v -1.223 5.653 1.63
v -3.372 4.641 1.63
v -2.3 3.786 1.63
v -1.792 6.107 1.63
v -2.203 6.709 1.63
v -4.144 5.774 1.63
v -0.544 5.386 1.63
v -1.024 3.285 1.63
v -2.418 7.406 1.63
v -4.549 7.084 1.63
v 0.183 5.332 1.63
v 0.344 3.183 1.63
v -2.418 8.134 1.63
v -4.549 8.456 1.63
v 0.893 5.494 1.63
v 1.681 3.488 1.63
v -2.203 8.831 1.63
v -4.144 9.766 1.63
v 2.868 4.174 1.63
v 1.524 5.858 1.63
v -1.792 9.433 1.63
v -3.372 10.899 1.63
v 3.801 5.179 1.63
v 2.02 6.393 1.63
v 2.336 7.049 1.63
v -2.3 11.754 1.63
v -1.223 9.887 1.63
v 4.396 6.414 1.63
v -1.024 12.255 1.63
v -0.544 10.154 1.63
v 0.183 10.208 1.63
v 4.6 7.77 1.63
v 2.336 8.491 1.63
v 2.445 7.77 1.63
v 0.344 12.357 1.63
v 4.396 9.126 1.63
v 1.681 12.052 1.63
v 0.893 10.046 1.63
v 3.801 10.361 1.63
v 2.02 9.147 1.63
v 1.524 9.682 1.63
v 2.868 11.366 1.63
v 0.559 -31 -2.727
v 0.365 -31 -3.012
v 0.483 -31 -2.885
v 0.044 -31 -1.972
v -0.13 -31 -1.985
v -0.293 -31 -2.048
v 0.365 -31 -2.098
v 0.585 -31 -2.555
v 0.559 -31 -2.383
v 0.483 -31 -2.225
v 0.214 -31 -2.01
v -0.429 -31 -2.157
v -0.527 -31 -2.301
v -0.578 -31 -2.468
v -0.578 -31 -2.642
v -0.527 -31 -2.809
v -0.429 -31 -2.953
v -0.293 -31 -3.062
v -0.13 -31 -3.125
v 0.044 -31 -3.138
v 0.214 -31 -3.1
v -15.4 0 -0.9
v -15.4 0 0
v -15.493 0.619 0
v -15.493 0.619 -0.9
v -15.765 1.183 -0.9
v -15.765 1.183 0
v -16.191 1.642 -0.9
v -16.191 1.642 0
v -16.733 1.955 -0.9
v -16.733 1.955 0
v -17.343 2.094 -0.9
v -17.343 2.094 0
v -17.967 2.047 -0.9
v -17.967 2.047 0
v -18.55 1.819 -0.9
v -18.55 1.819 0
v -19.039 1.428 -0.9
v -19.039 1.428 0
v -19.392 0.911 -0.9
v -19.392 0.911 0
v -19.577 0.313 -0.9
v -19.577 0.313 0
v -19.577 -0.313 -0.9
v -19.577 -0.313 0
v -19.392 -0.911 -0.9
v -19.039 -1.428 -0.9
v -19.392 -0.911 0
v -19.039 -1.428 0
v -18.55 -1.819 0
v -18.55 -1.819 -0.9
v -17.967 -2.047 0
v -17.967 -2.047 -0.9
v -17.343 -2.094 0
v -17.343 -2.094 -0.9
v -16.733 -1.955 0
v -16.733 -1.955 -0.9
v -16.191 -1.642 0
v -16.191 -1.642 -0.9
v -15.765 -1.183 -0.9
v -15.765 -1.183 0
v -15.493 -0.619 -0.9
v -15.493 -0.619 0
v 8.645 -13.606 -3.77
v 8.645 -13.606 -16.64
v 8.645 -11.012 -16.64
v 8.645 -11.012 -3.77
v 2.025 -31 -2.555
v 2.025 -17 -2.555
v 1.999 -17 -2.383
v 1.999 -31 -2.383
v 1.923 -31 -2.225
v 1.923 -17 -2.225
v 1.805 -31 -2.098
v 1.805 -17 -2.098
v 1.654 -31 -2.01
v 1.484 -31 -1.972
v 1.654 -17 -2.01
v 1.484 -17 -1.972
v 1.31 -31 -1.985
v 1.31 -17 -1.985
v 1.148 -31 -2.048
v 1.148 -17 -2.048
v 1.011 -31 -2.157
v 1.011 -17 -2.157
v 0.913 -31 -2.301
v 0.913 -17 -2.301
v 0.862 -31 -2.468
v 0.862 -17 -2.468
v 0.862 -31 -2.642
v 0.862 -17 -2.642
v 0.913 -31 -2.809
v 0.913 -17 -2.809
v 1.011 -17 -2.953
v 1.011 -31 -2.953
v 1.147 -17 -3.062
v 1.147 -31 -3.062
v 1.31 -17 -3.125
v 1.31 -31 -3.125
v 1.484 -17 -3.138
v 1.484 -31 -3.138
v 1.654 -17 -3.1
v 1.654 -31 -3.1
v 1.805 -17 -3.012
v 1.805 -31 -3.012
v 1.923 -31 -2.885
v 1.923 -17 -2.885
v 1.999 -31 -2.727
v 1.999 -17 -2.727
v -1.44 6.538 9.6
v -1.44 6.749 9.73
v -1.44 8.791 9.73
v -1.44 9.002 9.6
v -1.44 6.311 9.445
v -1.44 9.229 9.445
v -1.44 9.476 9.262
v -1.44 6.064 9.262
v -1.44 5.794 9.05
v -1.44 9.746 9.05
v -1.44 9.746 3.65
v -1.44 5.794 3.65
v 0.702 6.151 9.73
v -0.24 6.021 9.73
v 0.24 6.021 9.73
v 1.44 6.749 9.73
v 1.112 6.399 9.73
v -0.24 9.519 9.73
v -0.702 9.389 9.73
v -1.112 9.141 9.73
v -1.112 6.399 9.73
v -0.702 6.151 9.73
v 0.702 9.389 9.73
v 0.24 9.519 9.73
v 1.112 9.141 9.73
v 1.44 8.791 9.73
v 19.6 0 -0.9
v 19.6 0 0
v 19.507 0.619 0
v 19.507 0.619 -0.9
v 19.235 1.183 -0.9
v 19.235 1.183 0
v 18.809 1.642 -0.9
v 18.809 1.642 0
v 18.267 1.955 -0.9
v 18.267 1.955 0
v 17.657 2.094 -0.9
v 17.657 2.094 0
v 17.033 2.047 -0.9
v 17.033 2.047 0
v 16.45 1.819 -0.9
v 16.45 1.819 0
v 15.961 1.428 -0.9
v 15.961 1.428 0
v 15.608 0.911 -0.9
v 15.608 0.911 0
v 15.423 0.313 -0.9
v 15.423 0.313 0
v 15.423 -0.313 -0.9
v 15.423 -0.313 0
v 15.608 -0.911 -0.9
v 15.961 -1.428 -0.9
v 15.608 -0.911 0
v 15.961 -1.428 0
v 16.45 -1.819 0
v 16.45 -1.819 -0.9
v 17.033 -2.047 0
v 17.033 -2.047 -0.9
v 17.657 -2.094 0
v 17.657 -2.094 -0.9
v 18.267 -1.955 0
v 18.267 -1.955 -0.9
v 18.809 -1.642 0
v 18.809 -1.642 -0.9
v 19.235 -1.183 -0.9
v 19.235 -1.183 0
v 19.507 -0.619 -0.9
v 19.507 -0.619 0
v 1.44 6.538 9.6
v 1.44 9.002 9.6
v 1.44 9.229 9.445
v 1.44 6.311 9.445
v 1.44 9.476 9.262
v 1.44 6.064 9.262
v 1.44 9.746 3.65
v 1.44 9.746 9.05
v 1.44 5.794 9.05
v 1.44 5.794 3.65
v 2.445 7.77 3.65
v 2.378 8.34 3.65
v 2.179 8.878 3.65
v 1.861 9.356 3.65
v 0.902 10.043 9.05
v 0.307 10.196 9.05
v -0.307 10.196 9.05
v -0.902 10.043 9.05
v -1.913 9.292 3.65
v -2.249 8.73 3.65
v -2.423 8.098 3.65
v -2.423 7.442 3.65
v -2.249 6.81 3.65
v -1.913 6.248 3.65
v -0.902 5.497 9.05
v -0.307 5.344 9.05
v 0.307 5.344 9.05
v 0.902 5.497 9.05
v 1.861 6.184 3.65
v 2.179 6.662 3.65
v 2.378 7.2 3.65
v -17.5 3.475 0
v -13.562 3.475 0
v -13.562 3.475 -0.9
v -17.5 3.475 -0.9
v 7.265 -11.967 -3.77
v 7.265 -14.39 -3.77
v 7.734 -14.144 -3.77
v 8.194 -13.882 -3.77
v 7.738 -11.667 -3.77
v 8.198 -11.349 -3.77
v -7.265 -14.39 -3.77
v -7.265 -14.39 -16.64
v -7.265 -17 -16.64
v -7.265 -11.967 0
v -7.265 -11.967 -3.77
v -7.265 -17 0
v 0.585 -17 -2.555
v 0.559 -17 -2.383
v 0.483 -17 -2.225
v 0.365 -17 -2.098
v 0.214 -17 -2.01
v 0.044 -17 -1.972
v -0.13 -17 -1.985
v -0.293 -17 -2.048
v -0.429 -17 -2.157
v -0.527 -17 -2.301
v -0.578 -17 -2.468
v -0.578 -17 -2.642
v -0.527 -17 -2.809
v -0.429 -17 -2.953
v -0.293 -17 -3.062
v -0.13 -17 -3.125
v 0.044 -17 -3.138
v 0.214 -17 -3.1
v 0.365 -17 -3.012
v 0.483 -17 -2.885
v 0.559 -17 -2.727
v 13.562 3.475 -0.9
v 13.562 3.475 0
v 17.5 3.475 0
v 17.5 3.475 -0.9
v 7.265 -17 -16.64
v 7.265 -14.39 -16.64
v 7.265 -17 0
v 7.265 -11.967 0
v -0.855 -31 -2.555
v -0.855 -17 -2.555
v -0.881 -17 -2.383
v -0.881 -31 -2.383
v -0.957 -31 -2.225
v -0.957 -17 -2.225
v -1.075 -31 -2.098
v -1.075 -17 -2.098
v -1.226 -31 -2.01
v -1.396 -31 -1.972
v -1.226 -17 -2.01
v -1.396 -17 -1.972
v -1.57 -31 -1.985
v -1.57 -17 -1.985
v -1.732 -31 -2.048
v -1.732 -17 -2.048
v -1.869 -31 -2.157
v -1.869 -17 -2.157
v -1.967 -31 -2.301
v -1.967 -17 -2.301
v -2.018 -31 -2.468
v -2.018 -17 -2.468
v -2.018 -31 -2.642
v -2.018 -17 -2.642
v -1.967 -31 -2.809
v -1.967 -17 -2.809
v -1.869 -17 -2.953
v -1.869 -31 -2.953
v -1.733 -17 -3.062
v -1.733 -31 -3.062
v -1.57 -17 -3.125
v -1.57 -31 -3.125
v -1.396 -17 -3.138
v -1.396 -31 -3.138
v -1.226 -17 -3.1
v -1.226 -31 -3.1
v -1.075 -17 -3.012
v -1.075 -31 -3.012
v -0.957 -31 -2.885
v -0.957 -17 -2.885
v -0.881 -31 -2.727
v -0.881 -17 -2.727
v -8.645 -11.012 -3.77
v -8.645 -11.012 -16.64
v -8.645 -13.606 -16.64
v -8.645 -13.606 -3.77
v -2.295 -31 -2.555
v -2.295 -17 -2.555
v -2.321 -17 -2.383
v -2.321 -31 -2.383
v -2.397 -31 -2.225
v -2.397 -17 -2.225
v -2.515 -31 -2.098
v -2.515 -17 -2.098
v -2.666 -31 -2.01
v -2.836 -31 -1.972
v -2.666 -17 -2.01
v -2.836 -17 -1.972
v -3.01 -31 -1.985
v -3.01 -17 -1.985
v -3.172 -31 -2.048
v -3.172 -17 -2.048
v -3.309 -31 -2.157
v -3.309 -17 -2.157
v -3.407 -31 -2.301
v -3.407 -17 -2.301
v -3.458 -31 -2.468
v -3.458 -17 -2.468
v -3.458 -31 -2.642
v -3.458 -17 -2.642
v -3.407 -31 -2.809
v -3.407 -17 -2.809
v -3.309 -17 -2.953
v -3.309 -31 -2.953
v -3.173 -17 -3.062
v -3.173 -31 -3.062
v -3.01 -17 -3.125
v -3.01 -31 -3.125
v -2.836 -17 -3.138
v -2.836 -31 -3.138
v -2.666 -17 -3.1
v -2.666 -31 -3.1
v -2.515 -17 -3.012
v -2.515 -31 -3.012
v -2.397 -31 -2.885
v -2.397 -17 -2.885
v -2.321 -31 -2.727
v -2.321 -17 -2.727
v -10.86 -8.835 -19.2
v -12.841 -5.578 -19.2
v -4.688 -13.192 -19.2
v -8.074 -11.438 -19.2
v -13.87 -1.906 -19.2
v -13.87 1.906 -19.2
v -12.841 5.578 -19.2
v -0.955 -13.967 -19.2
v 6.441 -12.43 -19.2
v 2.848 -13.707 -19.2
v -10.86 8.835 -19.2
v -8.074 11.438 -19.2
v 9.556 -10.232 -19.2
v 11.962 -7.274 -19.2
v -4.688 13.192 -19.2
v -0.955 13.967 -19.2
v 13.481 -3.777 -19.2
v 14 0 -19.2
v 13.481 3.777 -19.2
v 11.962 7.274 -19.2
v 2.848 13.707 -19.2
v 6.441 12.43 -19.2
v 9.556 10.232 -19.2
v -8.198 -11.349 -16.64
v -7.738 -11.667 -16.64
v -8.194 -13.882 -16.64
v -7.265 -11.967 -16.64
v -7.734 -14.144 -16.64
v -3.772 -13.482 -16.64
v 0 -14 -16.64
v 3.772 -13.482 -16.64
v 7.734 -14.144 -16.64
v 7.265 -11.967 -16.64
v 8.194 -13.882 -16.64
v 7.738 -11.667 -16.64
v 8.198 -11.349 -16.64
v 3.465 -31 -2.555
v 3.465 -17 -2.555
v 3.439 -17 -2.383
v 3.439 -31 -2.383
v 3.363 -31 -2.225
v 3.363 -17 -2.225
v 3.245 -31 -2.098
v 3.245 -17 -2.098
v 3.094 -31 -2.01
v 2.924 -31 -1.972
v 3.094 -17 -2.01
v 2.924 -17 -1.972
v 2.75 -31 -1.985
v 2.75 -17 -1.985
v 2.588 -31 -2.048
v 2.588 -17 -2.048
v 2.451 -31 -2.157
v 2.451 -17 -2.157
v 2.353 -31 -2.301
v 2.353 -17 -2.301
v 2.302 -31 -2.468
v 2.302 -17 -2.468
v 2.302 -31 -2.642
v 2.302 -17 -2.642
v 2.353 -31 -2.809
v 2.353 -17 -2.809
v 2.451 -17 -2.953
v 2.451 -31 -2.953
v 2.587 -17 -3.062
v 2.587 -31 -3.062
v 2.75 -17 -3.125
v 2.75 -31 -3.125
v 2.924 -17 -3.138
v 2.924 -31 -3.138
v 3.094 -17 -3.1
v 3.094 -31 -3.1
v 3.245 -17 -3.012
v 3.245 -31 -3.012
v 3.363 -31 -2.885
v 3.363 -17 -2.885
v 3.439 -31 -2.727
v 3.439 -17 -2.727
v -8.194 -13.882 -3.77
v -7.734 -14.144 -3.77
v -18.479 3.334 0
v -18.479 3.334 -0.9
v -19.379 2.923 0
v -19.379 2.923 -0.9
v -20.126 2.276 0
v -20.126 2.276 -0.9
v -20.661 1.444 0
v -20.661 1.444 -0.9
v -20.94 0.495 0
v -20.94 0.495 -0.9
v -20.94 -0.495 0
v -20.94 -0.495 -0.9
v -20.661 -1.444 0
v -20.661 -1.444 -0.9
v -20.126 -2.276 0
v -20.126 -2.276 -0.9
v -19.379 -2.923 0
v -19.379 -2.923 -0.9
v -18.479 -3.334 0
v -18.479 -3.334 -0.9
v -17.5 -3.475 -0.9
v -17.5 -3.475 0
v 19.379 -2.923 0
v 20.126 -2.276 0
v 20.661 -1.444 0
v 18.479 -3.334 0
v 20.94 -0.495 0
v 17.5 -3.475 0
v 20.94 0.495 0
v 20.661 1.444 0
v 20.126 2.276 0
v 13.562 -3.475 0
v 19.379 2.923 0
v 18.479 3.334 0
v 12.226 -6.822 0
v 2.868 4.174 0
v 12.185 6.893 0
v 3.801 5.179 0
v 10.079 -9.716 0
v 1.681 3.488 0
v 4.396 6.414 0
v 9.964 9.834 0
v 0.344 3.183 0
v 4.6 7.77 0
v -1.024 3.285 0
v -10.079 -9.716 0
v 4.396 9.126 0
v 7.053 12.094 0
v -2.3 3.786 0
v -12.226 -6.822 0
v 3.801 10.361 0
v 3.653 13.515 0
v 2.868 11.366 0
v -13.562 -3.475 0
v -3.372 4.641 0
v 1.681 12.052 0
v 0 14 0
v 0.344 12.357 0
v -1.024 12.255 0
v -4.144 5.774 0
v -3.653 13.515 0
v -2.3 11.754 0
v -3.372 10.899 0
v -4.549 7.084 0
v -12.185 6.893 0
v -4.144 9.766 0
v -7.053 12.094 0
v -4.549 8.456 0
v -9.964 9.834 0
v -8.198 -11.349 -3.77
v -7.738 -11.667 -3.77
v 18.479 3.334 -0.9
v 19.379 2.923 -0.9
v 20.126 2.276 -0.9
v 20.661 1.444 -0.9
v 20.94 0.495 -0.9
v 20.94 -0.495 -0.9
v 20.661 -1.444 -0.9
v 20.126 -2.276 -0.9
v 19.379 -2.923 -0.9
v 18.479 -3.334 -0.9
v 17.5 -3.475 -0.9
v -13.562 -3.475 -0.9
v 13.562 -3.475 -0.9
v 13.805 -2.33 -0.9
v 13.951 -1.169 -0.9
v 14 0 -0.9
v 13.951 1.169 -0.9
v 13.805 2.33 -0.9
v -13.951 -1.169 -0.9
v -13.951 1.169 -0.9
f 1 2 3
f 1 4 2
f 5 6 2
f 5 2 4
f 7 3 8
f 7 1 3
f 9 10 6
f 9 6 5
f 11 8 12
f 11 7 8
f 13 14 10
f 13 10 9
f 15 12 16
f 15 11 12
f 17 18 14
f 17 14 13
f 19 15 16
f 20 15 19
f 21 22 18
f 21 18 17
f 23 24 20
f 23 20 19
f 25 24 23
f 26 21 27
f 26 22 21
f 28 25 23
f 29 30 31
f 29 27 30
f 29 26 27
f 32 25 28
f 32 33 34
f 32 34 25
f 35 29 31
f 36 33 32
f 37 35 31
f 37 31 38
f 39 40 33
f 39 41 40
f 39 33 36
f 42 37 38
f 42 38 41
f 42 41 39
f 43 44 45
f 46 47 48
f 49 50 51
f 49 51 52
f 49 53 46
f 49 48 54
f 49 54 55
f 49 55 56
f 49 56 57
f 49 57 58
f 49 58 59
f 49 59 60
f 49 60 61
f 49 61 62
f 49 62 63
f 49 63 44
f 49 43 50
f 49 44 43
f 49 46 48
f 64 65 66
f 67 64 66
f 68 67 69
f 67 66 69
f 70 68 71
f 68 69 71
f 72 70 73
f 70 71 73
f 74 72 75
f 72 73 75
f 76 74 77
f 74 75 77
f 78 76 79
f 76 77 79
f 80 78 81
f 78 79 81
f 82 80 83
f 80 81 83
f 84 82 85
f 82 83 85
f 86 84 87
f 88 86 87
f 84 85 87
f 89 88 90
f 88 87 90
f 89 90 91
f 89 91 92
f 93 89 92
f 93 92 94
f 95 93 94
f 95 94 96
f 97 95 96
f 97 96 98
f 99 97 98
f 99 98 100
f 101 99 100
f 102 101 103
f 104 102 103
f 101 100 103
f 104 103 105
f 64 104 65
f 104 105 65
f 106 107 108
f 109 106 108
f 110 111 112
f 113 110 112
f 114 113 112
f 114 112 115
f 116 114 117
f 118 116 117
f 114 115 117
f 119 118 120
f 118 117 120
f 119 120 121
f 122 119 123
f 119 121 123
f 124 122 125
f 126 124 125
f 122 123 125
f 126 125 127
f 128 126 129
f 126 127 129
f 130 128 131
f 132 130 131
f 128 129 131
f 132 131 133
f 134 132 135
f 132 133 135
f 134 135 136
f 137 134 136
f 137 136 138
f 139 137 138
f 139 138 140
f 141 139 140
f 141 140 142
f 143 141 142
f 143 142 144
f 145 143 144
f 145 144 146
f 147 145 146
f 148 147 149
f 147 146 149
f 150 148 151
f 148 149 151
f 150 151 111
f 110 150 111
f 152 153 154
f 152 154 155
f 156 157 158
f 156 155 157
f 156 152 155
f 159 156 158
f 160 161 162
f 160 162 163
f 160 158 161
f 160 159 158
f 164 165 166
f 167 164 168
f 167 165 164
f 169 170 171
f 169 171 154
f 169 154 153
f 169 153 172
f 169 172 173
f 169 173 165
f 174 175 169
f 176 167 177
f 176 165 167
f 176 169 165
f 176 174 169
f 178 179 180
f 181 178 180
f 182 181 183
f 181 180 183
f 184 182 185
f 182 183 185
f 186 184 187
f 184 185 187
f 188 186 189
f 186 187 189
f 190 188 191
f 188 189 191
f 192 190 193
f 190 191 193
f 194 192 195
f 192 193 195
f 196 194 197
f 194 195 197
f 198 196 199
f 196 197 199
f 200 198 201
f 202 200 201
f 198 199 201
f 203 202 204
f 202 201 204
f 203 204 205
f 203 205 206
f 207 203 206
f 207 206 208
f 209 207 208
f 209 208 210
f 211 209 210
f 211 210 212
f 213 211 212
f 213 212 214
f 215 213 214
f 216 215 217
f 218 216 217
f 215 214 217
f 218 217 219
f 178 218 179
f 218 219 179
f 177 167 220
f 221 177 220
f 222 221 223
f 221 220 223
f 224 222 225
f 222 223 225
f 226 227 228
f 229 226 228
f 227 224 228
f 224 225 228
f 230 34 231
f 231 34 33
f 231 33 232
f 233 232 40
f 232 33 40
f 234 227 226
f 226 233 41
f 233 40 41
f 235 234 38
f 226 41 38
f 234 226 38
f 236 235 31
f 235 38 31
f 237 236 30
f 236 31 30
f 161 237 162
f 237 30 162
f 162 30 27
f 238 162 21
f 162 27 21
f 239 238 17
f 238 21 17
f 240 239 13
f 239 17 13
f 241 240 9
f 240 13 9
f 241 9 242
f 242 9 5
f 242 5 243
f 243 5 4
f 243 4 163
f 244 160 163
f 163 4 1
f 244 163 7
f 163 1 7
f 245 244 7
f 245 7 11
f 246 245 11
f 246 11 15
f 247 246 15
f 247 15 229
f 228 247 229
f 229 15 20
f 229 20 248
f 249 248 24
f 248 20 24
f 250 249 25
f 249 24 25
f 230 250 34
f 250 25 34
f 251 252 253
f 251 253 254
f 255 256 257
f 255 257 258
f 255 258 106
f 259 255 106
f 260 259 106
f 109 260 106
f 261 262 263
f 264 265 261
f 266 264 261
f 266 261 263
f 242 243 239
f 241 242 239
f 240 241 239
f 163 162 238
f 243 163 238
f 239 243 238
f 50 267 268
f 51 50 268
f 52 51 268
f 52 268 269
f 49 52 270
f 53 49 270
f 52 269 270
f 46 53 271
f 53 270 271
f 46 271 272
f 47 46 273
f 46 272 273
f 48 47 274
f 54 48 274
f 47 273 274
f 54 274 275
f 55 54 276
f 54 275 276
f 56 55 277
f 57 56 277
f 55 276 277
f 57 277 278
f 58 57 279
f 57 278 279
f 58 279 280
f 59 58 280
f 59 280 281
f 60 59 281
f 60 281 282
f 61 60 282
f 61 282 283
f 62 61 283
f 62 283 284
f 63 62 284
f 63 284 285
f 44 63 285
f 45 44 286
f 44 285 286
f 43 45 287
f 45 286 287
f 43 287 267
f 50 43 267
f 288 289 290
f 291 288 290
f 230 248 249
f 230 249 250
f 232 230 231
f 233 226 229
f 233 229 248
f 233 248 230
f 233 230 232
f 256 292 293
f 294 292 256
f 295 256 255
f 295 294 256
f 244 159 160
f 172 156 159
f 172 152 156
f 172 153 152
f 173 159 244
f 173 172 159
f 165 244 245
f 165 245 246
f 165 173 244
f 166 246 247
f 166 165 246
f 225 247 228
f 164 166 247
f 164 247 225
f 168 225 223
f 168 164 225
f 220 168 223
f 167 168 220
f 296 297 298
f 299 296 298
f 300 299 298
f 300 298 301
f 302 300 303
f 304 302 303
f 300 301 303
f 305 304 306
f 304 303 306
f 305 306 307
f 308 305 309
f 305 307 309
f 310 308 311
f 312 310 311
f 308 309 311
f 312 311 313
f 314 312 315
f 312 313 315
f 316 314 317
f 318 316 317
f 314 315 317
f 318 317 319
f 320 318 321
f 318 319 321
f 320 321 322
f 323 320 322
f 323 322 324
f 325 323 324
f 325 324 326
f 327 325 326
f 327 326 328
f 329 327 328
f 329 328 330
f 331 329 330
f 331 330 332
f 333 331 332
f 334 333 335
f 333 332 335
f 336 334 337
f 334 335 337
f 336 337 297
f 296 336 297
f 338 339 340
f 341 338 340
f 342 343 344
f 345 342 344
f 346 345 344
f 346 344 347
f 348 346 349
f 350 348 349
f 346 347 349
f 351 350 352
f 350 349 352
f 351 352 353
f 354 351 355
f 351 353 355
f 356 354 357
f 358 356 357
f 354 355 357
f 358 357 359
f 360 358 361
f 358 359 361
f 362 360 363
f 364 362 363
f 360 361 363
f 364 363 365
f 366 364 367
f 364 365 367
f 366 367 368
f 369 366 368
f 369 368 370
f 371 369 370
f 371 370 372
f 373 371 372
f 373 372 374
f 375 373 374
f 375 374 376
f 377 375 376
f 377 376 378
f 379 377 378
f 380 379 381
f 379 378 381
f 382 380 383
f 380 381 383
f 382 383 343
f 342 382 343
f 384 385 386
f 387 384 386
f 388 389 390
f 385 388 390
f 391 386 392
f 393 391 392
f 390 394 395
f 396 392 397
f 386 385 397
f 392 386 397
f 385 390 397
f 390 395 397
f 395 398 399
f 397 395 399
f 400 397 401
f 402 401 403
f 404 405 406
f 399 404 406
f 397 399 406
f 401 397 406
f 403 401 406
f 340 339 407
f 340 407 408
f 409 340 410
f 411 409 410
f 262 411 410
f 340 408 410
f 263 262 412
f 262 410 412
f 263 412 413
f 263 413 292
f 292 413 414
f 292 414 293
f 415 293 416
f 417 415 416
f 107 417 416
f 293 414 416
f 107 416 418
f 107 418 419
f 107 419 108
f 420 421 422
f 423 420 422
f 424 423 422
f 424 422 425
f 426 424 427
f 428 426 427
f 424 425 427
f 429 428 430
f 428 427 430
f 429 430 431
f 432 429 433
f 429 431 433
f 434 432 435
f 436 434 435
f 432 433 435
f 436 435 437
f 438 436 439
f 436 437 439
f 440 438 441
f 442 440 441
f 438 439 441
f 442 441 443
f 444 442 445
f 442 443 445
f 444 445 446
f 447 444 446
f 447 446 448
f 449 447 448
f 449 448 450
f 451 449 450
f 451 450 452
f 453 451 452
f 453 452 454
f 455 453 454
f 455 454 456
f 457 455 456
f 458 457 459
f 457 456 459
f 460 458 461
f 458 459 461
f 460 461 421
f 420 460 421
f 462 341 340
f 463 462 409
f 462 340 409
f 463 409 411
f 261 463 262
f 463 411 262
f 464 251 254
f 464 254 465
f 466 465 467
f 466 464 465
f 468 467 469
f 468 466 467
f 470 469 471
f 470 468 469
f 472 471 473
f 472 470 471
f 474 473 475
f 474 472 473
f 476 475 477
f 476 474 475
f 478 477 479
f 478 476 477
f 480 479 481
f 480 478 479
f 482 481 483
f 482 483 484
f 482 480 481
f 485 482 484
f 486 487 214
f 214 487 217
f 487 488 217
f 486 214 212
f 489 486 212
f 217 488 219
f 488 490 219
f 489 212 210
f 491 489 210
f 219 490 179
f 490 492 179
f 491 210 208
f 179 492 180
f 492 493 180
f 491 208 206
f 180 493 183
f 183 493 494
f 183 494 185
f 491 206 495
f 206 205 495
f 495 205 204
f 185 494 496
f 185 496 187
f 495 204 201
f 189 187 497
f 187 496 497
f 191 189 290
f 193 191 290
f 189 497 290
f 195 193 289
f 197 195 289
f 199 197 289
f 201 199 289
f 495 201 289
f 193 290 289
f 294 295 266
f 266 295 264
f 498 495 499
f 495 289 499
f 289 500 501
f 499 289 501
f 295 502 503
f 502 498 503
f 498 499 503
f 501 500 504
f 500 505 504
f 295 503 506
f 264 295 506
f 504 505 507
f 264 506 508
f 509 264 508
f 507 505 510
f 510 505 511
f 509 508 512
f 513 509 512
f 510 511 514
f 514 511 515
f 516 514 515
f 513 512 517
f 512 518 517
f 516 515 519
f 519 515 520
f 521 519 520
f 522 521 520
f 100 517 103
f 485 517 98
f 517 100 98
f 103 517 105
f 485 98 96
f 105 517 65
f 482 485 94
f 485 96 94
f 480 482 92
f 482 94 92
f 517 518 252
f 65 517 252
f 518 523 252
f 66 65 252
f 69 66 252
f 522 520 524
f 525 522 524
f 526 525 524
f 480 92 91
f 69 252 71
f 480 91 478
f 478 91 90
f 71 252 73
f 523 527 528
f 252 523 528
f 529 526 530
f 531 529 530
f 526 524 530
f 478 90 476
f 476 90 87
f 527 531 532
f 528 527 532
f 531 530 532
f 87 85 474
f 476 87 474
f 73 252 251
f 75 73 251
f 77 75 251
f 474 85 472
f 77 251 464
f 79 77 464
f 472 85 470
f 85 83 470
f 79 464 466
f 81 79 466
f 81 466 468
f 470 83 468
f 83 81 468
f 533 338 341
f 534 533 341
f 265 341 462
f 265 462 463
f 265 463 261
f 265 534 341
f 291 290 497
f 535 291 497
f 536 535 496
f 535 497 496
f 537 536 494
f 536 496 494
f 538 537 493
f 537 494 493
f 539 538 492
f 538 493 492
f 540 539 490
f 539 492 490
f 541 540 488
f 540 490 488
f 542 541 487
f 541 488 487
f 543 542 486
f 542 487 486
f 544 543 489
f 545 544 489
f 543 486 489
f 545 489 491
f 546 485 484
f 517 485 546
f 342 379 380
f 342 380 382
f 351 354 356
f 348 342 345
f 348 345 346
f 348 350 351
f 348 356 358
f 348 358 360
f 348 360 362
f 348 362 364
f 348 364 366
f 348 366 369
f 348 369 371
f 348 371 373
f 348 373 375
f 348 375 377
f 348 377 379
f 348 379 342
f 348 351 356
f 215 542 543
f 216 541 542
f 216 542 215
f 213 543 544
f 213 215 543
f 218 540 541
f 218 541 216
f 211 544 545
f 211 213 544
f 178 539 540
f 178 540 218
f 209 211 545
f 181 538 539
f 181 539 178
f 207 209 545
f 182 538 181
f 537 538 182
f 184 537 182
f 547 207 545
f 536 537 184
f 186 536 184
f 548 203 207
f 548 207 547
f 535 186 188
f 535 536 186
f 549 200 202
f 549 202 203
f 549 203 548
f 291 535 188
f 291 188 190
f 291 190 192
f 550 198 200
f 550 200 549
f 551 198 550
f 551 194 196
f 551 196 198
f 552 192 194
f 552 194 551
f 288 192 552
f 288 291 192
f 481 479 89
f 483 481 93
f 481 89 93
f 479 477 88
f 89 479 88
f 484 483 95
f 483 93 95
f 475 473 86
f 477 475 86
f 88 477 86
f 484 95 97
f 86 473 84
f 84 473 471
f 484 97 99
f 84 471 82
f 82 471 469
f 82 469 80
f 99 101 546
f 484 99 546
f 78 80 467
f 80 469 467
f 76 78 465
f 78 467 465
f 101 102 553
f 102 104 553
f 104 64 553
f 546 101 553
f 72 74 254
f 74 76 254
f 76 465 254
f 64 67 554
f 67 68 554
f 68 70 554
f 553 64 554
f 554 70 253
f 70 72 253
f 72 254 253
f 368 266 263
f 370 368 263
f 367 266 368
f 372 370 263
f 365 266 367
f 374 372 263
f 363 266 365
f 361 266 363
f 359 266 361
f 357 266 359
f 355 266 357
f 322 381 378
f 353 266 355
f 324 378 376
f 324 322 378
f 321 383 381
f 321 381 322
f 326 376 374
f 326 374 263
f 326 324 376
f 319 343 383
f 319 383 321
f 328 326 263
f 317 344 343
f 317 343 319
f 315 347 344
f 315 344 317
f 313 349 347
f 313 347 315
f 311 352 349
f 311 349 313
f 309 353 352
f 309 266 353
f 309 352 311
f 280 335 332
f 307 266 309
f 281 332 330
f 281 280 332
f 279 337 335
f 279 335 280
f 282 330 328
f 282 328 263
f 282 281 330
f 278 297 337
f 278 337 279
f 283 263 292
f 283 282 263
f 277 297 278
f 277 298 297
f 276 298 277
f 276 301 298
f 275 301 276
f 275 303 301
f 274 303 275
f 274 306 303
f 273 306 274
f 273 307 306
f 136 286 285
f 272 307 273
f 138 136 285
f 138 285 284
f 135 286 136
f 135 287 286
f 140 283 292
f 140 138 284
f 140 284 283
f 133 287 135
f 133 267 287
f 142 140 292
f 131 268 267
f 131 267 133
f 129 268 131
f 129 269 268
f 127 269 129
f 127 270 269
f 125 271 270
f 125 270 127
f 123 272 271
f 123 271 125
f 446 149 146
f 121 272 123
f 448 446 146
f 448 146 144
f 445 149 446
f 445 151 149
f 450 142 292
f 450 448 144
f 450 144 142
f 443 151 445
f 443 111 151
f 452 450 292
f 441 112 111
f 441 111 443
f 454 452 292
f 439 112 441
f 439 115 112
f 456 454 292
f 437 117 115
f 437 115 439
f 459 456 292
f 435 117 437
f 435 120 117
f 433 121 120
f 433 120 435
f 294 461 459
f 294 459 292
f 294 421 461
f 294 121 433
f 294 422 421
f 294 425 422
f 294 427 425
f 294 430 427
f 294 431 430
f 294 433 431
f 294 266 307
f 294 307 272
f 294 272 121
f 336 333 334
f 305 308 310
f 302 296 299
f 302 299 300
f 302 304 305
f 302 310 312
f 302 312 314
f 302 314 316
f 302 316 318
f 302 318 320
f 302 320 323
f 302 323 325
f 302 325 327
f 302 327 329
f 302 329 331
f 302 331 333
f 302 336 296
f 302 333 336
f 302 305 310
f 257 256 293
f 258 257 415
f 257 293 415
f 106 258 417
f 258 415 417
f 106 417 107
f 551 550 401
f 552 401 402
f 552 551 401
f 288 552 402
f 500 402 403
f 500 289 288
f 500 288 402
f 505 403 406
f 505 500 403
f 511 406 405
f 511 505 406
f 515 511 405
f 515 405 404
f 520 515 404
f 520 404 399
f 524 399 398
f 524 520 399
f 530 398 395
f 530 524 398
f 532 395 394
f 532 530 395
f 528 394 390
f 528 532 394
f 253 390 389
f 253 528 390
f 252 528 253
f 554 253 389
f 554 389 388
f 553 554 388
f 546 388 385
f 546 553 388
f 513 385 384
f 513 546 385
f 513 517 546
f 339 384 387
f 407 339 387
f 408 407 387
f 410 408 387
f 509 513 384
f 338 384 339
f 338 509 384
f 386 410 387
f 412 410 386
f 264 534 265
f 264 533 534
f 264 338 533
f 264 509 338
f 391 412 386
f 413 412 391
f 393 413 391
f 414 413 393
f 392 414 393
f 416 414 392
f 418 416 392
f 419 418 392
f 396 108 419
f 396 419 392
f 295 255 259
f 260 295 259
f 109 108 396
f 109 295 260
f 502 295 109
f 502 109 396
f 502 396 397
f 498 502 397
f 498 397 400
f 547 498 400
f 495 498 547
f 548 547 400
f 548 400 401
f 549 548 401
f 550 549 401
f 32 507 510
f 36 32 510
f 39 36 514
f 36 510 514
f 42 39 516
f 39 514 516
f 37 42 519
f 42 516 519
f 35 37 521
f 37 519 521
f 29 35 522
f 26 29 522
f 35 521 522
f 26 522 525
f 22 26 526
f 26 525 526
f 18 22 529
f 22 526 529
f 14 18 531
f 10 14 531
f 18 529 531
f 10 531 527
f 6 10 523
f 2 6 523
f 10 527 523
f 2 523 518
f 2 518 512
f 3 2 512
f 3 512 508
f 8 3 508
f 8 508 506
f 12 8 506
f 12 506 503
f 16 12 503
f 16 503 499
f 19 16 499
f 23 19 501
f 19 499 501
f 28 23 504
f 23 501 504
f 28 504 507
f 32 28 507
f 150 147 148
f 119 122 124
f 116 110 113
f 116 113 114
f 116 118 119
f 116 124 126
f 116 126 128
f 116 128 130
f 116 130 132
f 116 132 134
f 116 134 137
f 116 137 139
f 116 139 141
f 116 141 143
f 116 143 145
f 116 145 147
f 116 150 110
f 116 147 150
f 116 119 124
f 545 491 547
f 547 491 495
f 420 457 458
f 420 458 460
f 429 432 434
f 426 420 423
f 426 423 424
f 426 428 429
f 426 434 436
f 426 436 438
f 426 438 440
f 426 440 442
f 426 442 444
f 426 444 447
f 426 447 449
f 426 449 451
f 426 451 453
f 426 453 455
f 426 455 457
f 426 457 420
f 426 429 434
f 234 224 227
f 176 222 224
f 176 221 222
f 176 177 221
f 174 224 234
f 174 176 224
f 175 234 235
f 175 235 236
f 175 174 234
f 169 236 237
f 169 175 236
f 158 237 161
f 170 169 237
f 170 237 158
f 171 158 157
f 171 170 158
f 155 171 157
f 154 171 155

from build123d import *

# Parameters (mm, degrees)
SKETCH1_R           = 14
BOSS_EXTRUDE1_DEPTH = 19.2
BOSS_EXTRUDE2_DEPTH = 16.64
BOSS_EXTRUDE3_DEPTH = 12.87
SKETCH4_R           = 0.585
BOSS_EXTRUDE4_DEPTH = 14
SKETCH5_R           = 4.6
BOSS_EXTRUDE5_DEPTH = 1.63
SKETCH6_R           = 2.445
BOSS_EXTRUDE6_DEPTH = 8.1
CUT_EXTRUDE1_DEPTH  = 6.08
CHAMFER1_SIZE       = 0.68
SKETCH8_R           = 2.1
BOSS_EXTRUDE7_DEPTH = 0.9


with BuildPart() as part:
    # Sketch1 → Boss-Extrude1 (new body)
    with BuildSketch(Plane.XY):
        Circle(SKETCH1_R)
    extrude(amount=-BOSS_EXTRUDE1_DEPTH)

    # Sketch2 → Boss-Extrude2 (add)
    with BuildSketch(Plane.XY):
        with BuildLine():
            Line((-7.265, -11.967446469), (-7.265, -17))
            Line((-7.265, -17), (7.265, -17))
            Line((7.265, -17), (7.265, -11.967446469))
            ThreePointArc((7.265, -11.967446469), (0, -14), (-7.265, -11.967446469))
        make_face()
    extrude(amount=-BOSS_EXTRUDE2_DEPTH)

    # Sketch3 → Boss-Extrude3 (add)
    with BuildSketch(Plane(origin=(0, 0, -16.64), x_dir=(-1, 0, 0), z_dir=(0, 0, -1))):
        with BuildLine():
            Line((7.265, -14.390072098), (7.265, -11.967446469))
            ThreePointArc((7.265, -11.967446469), (7.969331726, -11.510419273), (8.645, -11.011992327))
            Line((8.645, -11.011992327), (8.645, -13.605821364))
            ThreePointArc((8.645, -13.605821364), (7.964658643, -14.014942479), (7.265, -14.390072098))
        make_face()
        with BuildLine():
            Line((-7.265, -11.967446469), (-7.265, -14.390072098))
            ThreePointArc((-7.265, -14.390072098), (-7.964658643, -14.014942479), (-8.645, -13.605821364))
            Line((-8.645, -13.605821364), (-8.645, -11.011992327))
            ThreePointArc((-8.645, -11.011992327), (-7.969331726, -11.510419273), (-7.265, -11.967446469))
        make_face()
    extrude(amount=-BOSS_EXTRUDE3_DEPTH)

    # Sketch4 → Boss-Extrude4 (add)
    with BuildSketch(Plane.XZ.offset(17)):
        with Locations((-2.88, -2.555)):
            Circle(SKETCH4_R)
        with Locations((-1.44, -2.555)):
            Circle(SKETCH4_R)
        with Locations((0, -2.555)):
            Circle(SKETCH4_R)
        with Locations((1.44, -2.555)):
            Circle(SKETCH4_R)
        with Locations((2.88, -2.555)):
            Circle(SKETCH4_R)
    extrude(amount=BOSS_EXTRUDE4_DEPTH)

    # Sketch5 → Boss-Extrude5 (add)
    with BuildSketch(Plane.XY):
        with Locations((0, 7.77)):
            Circle(SKETCH5_R)
    extrude(amount=BOSS_EXTRUDE5_DEPTH)

    # Sketch6 → Boss-Extrude6 (add)
    with BuildSketch(Plane.XY.offset(1.63)):
        with Locations((0, 7.77)):
            Circle(SKETCH6_R)
    extrude(amount=BOSS_EXTRUDE6_DEPTH)

    # Sketch7 → Cut-Extrude1 (cut)
    with BuildSketch(Plane.XY.offset(9.73)):
        with BuildLine():
            Line((1.44, 9.745961791), (1.44, 5.794038209))
            ThreePointArc((1.44, 5.794038209), (2.445, 7.77), (1.44, 9.745961791))
        make_face()
        with BuildLine():
            Line((-1.44, 9.745961791), (-1.44, 5.794038209))
            ThreePointArc((-1.44, 5.794038209), (-2.445, 7.77), (-1.44, 9.745961791))
        make_face()
    extrude(amount=-CUT_EXTRUDE1_DEPTH, mode=Mode.SUBTRACT)

    # Chamfer1
    chamfer1_edges = [part.edges().sort_by_distance(p)[0] for p in [
        (0, 10.215, 9.73),
        (0, 5.325, 9.73),
    ]]
    chamfer(chamfer1_edges, length=CHAMFER1_SIZE)

    # Sketch8 → Boss-Extrude7 (add)
    with BuildSketch(Plane.XY):
        with BuildLine():
            Line((-13.561872105, 3.475), (-17.5, 3.475))
            ThreePointArc((-17.5, 3.475), (-20.975, 0), (-17.5, -3.475))
            Line((-17.5, -3.475), (-13.561872105, -3.475))
            ThreePointArc((-13.561872105, -3.475), (-14, 0), (-13.561872105, 3.475))
        make_face()
        with Locations((-17.5, 0)):
            Circle(SKETCH8_R, mode=Mode.SUBTRACT)
        with BuildLine():
            Line((17.5, -3.475), (13.561872105, -3.475))
            ThreePointArc((13.561872105, -3.475), (14, 0), (13.561872105, 3.475))
            Line((13.561872105, 3.475), (17.5, 3.475))
            ThreePointArc((17.5, 3.475), (20.975, 0), (17.5, -3.475))
        make_face()
        with Locations((17.5, 0)):
            Circle(SKETCH8_R, mode=Mode.SUBTRACT)
    extrude(amount=-BOSS_EXTRUDE7_DEPTH)


solid = part.part
